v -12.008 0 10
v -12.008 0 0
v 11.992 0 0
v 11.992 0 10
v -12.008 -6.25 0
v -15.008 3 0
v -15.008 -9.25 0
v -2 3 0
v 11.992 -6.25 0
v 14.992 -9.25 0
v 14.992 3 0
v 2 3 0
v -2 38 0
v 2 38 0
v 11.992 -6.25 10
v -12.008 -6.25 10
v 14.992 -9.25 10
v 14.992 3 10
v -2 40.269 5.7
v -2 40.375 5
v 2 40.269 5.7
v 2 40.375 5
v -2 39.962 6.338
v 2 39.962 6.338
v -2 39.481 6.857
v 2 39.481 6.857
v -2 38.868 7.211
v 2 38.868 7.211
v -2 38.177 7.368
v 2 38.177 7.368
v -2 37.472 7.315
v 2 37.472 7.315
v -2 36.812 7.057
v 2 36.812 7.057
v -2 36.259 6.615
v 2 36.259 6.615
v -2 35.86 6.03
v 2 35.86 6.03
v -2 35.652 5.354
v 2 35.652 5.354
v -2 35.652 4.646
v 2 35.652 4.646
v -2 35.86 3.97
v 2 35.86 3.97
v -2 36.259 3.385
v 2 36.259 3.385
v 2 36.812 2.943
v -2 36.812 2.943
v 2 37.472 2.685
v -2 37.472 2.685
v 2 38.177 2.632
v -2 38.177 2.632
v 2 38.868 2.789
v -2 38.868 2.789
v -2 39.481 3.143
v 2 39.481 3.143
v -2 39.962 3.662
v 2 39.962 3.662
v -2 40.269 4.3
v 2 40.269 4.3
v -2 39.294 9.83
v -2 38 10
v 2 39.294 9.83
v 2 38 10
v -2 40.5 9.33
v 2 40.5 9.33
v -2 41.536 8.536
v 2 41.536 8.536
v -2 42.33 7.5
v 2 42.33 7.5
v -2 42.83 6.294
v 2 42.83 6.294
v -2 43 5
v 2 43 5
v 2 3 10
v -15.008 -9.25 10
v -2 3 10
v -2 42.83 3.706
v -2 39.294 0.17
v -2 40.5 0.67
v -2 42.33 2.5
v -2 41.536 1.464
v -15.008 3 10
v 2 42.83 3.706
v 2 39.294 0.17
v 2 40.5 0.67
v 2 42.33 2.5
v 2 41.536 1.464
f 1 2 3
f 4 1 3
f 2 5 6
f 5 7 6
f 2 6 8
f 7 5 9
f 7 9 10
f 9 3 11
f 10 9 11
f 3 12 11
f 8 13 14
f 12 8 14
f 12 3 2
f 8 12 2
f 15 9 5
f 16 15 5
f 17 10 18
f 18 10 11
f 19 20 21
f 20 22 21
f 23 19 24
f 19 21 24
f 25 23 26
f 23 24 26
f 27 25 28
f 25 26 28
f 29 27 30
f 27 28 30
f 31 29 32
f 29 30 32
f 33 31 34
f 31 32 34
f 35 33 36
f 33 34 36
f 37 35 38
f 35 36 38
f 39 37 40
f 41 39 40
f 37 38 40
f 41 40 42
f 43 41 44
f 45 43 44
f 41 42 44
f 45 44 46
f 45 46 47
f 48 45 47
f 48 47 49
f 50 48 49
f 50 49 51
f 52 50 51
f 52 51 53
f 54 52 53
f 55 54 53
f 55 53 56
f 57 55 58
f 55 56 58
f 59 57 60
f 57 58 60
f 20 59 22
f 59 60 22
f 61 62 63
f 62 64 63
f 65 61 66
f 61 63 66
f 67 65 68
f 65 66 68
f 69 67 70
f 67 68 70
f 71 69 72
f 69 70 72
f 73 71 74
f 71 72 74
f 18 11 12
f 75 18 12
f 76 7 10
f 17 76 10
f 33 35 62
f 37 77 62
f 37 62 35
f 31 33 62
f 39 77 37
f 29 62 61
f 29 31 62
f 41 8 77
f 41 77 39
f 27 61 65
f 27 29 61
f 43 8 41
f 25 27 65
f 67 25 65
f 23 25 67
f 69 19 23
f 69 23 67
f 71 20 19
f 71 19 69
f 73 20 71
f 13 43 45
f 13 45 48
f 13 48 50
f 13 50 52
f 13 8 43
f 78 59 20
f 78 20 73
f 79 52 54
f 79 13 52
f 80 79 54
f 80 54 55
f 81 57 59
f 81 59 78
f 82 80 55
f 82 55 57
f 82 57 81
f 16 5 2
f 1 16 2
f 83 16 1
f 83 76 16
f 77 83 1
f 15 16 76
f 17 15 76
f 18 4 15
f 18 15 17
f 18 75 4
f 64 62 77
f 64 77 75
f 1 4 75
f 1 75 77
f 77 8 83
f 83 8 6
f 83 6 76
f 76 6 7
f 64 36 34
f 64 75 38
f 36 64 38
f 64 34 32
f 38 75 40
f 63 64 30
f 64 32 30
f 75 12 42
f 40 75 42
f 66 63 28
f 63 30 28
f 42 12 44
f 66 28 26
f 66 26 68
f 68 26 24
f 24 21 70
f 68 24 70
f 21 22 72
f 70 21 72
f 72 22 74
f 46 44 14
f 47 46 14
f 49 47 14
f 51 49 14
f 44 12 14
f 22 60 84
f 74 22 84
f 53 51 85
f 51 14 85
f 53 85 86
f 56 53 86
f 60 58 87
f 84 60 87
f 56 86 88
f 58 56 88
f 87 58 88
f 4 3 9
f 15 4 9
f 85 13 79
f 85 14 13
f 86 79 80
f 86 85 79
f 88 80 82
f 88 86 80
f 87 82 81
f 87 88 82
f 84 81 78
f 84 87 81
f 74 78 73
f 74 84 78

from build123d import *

# Parameters (mm, degrees)
F0_W     = 4
F0_H     = 40
F1_DEPTH = 10
F2_R     = 2.375
F3_DEPTH = 12.5
F4_R     = 4.99999


# Not quite as in the source:
# - a fillet or chamfer is up to 0.001 mm smaller than in the source, because OpenCascade refuses the exact size


with BuildPart() as f1:
    # F0 (on Top) → F1 (new body)
    with BuildSketch(Plane.XY):
        Polygon((-12.0077335707, 3), (-12.0077335707, 0), (11.9922664293, 0), (11.9922664293, -6.25), (14.9922664293, -6.25), (14.9922664293, 3), (2, 3), (-2, 3), align=None)
        Polygon((-12.0077335707, -6.25), (-12.0077335707, 0), (-12.0077335707, 3), (-15.0077335707, 3), (-15.0077335707, -9.25), (-12.0077335707, -9.25), align=None)
        Polygon((11.9922664293, -6.25), (-12.0077335707, -6.25), (-12.0077335707, -9.25), (14.9922664293, -9.25), (14.9922664293, -6.25), align=None)
        with Locations((0, 23)):
            Rectangle(F0_W, F0_H)
    extrude(amount=F1_DEPTH)

    # F2 (on Right) → F3 (cut, symmetric)
    with BuildSketch(Plane.YZ):
        with Locations((38, 5)):
            Circle(F2_R)
    extrude(amount=F3_DEPTH, both=True, mode=Mode.SUBTRACT)

    # F4 (radius 5 in the source; OpenCascade refuses exactly that, so slightly less here)
    f4_edges = [f1.edges().sort_by_distance(p)[0] for p in [
        (0, 43, 10),
        (0, 43, 0),
    ]]
    fillet(f4_edges, radius=F4_R)


solid = f1.part
